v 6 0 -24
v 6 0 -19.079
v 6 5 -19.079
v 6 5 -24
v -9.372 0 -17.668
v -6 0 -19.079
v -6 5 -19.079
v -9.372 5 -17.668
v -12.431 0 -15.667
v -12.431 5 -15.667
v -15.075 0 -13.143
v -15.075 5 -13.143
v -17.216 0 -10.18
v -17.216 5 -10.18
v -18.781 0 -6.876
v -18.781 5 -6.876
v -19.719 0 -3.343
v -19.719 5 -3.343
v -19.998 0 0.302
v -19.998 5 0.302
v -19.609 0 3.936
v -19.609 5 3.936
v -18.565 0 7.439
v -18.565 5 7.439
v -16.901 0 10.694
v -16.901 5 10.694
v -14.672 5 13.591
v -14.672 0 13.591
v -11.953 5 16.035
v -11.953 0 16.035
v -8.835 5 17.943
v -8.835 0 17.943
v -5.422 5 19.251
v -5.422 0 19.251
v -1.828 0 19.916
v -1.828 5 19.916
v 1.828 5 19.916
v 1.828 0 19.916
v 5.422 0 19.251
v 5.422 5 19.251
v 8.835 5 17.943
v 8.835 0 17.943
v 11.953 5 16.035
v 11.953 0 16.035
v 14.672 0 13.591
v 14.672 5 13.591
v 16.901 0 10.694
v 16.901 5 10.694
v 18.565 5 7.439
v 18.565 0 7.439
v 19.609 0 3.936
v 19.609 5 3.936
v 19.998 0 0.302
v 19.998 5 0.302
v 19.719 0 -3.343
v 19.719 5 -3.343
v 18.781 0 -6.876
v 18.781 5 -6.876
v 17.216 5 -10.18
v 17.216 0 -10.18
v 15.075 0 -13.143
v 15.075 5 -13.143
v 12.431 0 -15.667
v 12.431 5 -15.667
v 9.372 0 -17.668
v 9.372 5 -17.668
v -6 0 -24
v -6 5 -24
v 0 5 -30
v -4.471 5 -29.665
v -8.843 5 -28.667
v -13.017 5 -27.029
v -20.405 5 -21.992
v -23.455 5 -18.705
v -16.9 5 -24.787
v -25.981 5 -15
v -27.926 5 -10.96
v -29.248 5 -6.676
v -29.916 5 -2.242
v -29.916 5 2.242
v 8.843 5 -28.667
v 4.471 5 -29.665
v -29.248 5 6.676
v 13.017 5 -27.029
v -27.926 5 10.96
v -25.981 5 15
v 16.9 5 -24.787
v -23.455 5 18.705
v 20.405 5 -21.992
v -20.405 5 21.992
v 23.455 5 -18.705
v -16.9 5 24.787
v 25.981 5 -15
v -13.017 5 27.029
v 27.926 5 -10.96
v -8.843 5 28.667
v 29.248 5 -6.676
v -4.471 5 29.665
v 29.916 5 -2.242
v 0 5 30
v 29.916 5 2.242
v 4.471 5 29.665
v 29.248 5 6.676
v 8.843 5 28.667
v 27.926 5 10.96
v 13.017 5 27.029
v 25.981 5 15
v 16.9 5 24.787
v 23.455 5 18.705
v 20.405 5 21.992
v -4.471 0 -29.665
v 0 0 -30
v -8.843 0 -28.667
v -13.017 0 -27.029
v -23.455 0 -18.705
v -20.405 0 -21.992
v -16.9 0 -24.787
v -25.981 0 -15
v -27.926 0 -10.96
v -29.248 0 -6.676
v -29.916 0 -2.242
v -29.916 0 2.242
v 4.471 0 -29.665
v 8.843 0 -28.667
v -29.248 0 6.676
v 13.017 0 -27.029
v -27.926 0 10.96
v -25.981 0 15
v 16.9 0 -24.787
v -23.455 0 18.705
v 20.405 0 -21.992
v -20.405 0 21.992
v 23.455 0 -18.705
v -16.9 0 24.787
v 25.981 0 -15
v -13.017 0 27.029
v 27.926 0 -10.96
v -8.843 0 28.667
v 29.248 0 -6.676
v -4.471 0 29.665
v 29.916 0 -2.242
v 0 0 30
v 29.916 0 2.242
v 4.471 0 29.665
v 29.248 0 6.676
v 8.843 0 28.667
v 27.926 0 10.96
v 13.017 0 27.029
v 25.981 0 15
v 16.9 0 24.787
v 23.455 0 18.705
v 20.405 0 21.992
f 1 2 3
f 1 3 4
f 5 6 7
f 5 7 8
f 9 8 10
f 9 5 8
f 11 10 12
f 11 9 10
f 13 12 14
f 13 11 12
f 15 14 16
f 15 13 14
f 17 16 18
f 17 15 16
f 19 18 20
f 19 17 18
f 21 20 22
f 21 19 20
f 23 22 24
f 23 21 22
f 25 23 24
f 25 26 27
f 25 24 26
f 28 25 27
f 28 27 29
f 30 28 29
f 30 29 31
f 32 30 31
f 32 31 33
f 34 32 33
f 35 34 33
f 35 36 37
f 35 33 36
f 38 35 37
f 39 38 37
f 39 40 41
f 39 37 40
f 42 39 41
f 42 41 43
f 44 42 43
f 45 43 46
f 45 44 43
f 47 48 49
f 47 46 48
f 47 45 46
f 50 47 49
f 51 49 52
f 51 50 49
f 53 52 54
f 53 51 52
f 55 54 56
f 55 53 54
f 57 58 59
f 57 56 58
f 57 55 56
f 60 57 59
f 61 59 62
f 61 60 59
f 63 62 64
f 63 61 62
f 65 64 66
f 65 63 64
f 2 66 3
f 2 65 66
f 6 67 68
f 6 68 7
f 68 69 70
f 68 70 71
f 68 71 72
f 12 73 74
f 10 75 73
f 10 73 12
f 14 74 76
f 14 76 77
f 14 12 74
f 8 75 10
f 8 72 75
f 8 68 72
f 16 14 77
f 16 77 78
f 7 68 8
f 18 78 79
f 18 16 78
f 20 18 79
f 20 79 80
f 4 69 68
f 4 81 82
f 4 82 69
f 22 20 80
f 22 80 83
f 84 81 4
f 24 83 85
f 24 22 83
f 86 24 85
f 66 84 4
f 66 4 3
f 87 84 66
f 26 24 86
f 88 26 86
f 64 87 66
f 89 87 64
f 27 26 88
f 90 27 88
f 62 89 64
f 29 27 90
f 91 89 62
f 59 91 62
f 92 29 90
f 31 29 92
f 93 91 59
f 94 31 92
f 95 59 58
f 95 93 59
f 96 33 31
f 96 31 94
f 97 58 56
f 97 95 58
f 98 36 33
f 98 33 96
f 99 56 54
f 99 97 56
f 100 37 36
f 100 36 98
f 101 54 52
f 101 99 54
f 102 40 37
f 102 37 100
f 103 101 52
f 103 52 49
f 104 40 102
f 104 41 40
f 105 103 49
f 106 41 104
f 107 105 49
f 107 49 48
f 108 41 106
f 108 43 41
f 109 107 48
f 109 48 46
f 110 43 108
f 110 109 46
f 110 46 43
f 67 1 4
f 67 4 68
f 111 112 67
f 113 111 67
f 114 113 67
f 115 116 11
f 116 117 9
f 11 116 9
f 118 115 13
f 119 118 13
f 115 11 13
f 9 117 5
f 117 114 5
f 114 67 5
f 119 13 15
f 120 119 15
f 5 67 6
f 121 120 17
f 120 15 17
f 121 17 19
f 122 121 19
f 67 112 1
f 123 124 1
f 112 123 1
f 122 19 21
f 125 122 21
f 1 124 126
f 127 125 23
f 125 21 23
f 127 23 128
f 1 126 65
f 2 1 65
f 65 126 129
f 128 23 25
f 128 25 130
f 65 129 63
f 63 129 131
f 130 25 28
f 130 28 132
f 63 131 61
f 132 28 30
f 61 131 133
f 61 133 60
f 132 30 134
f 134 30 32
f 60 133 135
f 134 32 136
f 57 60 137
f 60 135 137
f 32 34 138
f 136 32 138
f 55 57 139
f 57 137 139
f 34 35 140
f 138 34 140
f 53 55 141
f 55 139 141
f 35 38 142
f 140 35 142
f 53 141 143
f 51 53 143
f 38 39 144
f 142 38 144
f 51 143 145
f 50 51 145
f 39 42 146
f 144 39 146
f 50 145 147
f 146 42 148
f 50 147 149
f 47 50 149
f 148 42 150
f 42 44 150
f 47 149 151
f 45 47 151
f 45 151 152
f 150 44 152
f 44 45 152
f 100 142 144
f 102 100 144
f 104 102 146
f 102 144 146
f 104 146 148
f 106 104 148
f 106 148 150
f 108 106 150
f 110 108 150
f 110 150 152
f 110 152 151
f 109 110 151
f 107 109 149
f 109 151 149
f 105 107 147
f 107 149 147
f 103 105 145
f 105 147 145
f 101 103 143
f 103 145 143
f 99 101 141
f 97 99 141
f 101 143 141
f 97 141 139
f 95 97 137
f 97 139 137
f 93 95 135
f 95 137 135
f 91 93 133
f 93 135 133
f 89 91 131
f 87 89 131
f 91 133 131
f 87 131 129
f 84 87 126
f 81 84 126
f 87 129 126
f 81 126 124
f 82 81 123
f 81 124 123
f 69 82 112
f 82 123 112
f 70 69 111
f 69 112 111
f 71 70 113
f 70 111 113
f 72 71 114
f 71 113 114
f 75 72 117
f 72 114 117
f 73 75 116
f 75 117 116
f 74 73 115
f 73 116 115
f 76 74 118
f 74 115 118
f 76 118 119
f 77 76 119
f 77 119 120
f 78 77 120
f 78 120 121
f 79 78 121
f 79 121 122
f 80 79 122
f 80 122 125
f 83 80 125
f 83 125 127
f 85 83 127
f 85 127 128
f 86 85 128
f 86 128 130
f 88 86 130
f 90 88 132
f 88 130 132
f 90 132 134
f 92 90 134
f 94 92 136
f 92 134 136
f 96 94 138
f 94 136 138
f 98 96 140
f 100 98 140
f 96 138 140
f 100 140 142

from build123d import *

# Parameters (mm, degrees)
SKIZZE1_R                       = 30
AUFSATZ_LINEAR_AUSTRAGEN1_DEPTH = 5
SKIZZE1_3_R                     = 20
SCHNITT_LINEAR_AUSTRAGEN1_DEPTH = 5
SCHNITT_LINEAR_AUSTRAGEN2_DEPTH = 5


with BuildPart() as part:
    # Skizze1 → Aufsatz-Linear austragen1 (new body)
    with BuildSketch(Plane(origin=(0, 0, 0), x_dir=(1, 0, 0), z_dir=(0, 1, 0))):
        with Locations(Location((0, 0, 0), (0, 0, 270))):  # turned: the seam where the file's is
            Circle(SKIZZE1_R)
    extrude(amount=AUFSATZ_LINEAR_AUSTRAGEN1_DEPTH)

    # Skizze1_3 → Schnitt-Linear austragen1 (cut)
    with BuildSketch(Plane(origin=(0, 0, 0), x_dir=(1, 0, 0), z_dir=(0, 1, 0))):
        with Locations(Location((0, 0, 0), (0, 0, 270))):  # turned: the seam where the file's is
            Circle(SKIZZE1_3_R)
    extrude(amount=SCHNITT_LINEAR_AUSTRAGEN1_DEPTH, mode=Mode.SUBTRACT)

    # Skizze1_4 → Schnitt-Linear austragen2 (cut)
    with BuildSketch(Plane(origin=(0, 0, 0), x_dir=(1, 0, 0), z_dir=(0, 1, 0))):
        with BuildLine():
            ThreePointArc((-6, 19.078784028), (0, 20), (6, 19.078784028))
            Line((6, 19.078784028), (6, 24))
            Line((6, 24), (-6, 24))
            Line((-6, 24), (-6, 19.078784028))
        make_face()
    extrude(amount=SCHNITT_LINEAR_AUSTRAGEN2_DEPTH, mode=Mode.SUBTRACT)


solid = part.part
